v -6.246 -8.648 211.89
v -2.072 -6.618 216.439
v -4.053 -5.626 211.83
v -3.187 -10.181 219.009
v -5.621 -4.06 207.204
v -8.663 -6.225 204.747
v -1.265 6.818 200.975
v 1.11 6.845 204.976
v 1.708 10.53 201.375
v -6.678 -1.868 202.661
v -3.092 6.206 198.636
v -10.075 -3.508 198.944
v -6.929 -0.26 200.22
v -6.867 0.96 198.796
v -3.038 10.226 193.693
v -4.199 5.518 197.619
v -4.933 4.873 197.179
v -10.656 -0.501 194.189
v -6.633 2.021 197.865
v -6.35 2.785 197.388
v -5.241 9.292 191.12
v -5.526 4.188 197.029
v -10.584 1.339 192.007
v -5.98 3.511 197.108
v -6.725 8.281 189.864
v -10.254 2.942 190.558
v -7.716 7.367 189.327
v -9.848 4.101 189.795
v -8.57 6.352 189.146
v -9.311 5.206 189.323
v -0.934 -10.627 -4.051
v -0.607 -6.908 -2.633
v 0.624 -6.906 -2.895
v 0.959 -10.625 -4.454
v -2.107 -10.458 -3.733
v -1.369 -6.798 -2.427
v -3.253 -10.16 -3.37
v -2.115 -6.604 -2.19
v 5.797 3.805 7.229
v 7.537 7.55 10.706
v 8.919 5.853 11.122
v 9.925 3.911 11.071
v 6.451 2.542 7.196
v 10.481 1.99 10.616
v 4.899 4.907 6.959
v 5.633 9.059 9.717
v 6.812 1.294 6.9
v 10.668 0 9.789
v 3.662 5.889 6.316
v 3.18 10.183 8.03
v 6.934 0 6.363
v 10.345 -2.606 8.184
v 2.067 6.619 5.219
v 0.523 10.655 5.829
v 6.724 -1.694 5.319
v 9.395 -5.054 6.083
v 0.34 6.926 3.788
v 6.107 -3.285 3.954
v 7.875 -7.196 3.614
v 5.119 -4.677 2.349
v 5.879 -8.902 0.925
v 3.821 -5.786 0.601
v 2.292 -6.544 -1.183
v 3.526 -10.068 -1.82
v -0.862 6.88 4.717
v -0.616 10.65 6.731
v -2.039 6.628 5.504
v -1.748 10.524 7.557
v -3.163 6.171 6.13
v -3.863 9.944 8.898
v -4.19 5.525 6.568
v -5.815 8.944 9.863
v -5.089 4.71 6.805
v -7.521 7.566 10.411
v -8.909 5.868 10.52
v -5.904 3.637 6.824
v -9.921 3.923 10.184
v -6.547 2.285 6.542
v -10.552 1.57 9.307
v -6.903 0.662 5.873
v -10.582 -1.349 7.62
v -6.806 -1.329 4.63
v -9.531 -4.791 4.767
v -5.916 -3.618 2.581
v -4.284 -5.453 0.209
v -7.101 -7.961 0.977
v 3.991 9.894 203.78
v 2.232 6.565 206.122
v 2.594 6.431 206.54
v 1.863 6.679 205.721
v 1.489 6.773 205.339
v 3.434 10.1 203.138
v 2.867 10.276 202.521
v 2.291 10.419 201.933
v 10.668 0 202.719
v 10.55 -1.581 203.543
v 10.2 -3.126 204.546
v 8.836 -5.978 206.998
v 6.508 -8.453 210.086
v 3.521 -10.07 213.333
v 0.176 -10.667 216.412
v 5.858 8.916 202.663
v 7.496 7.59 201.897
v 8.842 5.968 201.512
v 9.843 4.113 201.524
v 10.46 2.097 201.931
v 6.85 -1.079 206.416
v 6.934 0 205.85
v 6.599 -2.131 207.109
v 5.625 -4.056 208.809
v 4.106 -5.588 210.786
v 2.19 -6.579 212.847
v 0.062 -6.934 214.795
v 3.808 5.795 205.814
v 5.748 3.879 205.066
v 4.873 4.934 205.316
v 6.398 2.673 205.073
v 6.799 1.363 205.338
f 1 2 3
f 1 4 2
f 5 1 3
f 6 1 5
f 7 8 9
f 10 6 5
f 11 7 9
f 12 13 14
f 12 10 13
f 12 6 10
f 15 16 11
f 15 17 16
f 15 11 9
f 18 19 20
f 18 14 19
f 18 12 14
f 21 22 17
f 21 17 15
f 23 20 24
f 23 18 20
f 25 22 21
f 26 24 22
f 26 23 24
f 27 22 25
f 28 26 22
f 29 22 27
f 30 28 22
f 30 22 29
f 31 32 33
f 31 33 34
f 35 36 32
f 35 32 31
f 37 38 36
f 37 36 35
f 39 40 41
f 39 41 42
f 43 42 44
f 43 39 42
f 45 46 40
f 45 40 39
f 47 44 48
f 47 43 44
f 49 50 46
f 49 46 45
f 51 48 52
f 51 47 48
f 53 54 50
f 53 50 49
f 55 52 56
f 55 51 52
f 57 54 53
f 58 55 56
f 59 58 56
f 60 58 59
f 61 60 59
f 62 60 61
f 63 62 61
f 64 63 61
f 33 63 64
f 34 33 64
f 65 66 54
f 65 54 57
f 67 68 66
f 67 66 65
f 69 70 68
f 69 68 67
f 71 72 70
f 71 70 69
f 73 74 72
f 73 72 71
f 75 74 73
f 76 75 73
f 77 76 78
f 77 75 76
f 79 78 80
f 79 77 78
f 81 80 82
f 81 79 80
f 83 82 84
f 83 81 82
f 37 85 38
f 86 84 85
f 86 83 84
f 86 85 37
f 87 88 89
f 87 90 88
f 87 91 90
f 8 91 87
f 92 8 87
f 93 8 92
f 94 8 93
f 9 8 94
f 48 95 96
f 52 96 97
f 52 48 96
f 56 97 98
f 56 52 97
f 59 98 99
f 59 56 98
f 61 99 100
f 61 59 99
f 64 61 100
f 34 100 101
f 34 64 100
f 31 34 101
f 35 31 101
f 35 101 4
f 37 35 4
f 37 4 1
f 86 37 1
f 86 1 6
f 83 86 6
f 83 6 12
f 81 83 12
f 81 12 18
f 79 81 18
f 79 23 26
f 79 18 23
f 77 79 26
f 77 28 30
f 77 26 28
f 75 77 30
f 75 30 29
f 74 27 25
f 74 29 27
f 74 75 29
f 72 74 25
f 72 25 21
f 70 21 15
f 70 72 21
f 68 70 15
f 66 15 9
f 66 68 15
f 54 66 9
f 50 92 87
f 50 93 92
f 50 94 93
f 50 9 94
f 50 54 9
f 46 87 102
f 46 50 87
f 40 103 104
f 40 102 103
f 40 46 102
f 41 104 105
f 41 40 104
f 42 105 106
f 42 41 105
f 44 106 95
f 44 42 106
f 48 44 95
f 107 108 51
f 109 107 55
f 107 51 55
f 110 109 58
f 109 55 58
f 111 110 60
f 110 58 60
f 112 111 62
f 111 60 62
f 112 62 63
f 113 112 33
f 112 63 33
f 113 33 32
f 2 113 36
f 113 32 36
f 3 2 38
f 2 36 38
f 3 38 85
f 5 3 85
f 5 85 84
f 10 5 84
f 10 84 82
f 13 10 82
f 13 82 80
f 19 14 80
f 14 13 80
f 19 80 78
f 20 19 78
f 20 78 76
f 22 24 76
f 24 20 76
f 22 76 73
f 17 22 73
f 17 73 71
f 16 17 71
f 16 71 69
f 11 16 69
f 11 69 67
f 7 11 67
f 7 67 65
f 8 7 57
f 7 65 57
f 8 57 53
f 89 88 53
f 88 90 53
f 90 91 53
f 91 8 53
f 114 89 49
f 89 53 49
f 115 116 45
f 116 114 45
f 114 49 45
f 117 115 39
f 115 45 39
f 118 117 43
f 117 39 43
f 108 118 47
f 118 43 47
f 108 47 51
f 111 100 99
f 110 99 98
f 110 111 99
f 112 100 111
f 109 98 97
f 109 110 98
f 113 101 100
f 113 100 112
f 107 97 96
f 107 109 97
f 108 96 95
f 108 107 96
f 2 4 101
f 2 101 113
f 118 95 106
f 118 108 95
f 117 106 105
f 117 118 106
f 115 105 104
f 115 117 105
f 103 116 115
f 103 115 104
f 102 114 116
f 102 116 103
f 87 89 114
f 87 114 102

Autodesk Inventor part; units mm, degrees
ref_plane "Start Plane" through (0, 0, -4.4541) normal (0, 0, 1) x (1, 0, 0)
ref_plane "End Plane" through (0, 0, 219.0092) normal (0, 0, 1) x (1, 0, 0)
sketch "Sketch" plane through (0, 0, 0) normal (0, 0, 1) x (1, 0, 0)
  circle A0 centre (0, 0) radius 6.9342
  circle A1 centre (0, 0) radius 10.668
  dimension "d0" = 21.336
  dimension "d1" = 3.7338
extrude "Body" add sketch "Sketch" along normal up to surface (223.4633 mm away) from surface at -4.4541
sketch "Sketch3" plane through (0, 0, 0) normal (0, 0, 1) x (1, 0, 0)
  line L0 (0, 0) -> (10, 0)
ref_plane "Work Plane3" through (0, 0, 0) normal (0, -1, 0) x (1, 0, 0)
sketch "Sketch4" plane through (0, 0, 0) normal (0, -1, 0) x (1, 0, 0)
  line L0 (-2, -4.4541) -> (12, -4.4541)
  line L1 (-2, 219.0092) -> (12, 219.0092)
  dimension "d7" = 223.4633
ref_plane "Work Plane4" through (-9.359, -5.1201, -11.1594) normal (0.6341, 0.3469, -0.691) x (-0.3015, -0.712, -0.6341)
split "Split1" plane through (-9.359, -5.1201, -11.1594) removes the side toward (0.6341, 0.3469, -0.691)
ref_plane "Work Plane5" through (5.0201, -9.413, -4.8357) normal (-0.1943, 0.3643, -0.9108) x (0.5769, 0.7934, 0.1943)
split "Split2" plane through (5.0201, -9.413, -4.8357) removes the side toward (-0.1943, 0.3643, -0.9108)
ref_plane "Work Plane6" through (8.586, -6.3314, -10.5353) normal (-0.5655, 0.417, -0.7115) x (-0.1087, 0.8175, 0.5655)
split "Split3" plane through (8.586, -6.3314, -10.5353) removes the side toward (-0.5655, 0.417, -0.7115)
ref_plane "Work Plane7" through (-9.359, -5.12, 221.8641) normal (0.6062, 0.3316, 0.7228) x (0.7867, -0.1167, -0.6062)
split "Split4" plane through (-9.359, -5.12, 221.8641) removes the side toward (0.6062, 0.3316, 0.7228)
ref_plane "Work Plane8" through (8.586, -6.3314, 234.1893) normal (-0.7274, 0.5364, 0.4281) x (0.6295, 0.2732, 0.7274)
split "Split5" plane through (8.586, -6.3314, 234.1893) removes the side toward (-0.7274, 0.5364, 0.4281)
ref_plane "Work Plane9" through (6.001, -8.8201, 225.8384) normal (-0.4494, 0.6606, 0.6014) x (0.8739, 0.1854, 0.4494)
split "Split6" plane through (6.001, -8.8201, 225.8384) removes the side toward (-0.4494, 0.6606, 0.6014)
equation "\"d0\" = G_H"
equation "\"d1\" = G_T"
equation "\"d2\" = G_L"
equation "\"G_H\" = 21.336"
equation "\"G_T\" = 3.7338"
equation "\"G_L\" = 223.46333"
equation "\"G_OFFSET_START\" = 4.45413"
equation "\"G_OFFSET_END\" = 7.34335"
equation "\"d4\" = -G_OFFSET_START"
equation "\"d5\" = G_OFFSET_END + B_L"
equation "\"B_L\" = 211.66585"
properties part number "ANSI - 1/2 x 0.147 - 8.798" material "Steel, Mild"
